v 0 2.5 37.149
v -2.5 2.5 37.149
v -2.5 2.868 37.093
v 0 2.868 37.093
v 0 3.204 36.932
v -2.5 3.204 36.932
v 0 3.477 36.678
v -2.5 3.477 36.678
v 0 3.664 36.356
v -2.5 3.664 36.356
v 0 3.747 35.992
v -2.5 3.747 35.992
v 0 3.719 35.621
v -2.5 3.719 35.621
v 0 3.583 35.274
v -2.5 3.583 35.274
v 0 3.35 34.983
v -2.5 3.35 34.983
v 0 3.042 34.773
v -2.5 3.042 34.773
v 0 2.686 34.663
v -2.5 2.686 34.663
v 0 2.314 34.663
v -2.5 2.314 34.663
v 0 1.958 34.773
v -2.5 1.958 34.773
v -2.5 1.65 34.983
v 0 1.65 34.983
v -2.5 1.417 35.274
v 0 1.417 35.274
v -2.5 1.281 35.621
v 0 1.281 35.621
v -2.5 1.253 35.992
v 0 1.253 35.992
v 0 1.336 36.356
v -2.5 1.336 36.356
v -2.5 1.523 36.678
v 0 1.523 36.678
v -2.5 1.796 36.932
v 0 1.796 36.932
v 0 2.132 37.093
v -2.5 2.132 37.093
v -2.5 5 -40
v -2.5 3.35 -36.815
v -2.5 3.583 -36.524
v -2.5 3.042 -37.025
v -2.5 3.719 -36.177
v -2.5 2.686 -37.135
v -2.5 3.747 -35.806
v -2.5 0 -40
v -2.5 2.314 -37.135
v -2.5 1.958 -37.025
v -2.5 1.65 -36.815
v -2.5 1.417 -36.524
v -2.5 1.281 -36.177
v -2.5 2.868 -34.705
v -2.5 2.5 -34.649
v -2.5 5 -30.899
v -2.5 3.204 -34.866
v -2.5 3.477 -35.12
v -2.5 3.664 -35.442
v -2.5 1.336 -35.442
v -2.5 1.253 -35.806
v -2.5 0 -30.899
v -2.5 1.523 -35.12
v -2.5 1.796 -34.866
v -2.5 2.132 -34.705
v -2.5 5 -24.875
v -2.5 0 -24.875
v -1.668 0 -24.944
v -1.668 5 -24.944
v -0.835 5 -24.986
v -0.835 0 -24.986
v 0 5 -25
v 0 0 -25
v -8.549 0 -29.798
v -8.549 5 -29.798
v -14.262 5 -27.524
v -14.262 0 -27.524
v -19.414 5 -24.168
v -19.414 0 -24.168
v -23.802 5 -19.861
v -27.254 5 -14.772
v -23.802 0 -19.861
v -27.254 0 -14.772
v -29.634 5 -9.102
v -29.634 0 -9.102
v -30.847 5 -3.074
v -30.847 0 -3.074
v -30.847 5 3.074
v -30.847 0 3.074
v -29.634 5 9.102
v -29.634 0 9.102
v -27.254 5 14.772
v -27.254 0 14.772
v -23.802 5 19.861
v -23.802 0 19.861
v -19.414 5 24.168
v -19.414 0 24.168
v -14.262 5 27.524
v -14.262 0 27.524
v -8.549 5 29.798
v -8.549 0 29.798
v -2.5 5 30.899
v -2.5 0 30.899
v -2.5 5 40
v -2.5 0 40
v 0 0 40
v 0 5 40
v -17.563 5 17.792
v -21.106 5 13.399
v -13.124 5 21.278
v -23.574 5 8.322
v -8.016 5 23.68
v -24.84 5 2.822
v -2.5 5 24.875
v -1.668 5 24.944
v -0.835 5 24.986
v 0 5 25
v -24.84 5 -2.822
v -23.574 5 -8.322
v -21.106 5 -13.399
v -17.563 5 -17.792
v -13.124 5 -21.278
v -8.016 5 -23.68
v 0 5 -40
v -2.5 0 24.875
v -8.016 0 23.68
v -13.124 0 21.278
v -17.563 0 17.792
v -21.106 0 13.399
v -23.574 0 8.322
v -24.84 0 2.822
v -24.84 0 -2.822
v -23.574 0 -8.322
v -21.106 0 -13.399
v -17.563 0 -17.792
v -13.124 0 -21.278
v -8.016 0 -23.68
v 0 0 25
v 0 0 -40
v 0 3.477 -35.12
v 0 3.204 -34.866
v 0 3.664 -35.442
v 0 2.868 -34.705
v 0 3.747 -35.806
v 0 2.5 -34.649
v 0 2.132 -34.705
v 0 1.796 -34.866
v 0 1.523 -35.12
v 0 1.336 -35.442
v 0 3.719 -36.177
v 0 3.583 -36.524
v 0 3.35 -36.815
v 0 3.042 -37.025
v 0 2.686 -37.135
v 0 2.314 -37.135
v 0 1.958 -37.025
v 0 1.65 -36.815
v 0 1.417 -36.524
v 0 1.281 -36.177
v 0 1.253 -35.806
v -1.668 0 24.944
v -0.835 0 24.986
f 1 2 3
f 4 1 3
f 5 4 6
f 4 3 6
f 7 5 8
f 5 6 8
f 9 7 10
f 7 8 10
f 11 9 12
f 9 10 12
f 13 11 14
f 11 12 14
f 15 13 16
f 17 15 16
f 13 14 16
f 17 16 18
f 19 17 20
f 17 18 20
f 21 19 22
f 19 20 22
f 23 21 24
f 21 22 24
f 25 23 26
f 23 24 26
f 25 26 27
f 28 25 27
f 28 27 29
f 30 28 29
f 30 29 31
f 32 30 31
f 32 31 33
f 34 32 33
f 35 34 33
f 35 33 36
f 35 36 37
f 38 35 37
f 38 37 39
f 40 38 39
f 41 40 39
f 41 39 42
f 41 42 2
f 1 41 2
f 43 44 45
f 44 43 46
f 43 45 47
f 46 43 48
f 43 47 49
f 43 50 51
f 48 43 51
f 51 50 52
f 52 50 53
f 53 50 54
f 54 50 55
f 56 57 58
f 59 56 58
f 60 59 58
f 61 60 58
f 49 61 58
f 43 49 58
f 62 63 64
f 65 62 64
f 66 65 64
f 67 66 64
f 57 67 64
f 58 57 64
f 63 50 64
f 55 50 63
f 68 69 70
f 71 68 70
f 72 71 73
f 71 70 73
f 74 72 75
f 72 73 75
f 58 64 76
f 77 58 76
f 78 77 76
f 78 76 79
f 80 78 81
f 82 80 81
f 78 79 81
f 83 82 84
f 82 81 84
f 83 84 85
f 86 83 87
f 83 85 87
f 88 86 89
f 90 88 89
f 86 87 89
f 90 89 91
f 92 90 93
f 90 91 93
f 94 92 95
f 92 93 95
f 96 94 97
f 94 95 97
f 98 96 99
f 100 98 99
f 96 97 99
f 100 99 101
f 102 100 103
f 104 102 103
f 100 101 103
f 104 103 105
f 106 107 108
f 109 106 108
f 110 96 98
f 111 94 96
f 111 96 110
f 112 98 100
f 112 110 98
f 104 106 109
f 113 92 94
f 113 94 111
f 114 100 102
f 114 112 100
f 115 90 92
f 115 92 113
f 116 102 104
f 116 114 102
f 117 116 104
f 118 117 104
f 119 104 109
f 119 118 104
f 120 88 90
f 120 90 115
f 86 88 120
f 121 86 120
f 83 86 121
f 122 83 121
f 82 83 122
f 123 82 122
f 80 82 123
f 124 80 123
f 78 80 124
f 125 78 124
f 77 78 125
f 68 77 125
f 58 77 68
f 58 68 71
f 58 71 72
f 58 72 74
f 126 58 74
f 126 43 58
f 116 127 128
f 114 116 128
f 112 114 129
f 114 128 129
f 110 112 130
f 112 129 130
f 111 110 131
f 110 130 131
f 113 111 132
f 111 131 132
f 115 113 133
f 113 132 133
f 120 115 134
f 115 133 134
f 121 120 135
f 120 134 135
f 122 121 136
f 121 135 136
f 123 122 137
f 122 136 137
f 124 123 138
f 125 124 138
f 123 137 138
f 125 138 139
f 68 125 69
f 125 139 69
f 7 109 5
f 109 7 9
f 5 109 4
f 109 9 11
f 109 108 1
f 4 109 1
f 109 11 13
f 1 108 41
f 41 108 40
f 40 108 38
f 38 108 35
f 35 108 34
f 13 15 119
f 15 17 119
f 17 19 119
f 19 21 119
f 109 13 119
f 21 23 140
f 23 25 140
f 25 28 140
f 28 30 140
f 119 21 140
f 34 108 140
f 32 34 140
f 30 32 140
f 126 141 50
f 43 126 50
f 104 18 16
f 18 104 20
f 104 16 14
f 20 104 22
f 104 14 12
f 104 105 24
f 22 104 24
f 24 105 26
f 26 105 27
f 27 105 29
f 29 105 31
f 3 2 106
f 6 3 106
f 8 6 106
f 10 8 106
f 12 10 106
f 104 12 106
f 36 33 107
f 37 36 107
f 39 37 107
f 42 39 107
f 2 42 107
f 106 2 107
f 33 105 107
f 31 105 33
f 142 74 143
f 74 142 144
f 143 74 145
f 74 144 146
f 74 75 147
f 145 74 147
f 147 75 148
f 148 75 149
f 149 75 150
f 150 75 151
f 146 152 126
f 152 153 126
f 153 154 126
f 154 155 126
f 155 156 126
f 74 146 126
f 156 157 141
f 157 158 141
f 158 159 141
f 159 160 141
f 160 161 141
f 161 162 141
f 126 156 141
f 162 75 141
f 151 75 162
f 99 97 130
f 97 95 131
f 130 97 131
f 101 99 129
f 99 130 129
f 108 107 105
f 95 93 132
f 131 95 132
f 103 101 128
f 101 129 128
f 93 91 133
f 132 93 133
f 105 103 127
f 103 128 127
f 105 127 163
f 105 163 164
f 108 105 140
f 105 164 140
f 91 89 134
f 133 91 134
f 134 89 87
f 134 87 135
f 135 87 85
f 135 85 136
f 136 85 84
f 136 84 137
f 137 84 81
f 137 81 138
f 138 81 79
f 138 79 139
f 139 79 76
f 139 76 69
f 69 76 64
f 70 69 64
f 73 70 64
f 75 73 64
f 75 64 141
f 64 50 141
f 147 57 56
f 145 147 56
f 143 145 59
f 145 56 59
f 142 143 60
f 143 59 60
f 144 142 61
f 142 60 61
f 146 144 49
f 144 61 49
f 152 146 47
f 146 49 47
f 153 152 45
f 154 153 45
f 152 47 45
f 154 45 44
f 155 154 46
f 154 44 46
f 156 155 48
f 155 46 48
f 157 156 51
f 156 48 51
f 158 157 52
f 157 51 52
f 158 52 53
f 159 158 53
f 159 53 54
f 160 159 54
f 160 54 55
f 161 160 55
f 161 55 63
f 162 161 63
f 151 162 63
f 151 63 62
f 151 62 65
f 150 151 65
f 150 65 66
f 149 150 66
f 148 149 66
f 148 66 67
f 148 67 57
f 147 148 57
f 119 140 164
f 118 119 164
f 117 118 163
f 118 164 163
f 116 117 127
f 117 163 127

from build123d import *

# Parameters (mm, degrees)
BOSS_EXTRUDE1_DEPTH = 5
SKETCH5_R           = 1.25
CUT_EXTRUDE1_DEPTH  = 3.5


with BuildPart() as part:
    # Sketch1 → Boss-Extrude1 (new body)
    with BuildSketch(Plane(origin=(0, 0, 0), x_dir=(1, 0, 0), z_dir=(0, 1, 0))):
        with BuildLine():
            Line((-2.5, -30.899029111), (-2.5, -24.874685928))
            ThreePointArc((-2.5, -24.874685928), (-25, 0), (-2.5, 24.874685928))
            Line((-2.5, 24.874685928), (-2.5, 30.899029111))
            ThreePointArc((-2.5, 30.899029111), (-31, 0), (-2.5, -30.899029111))
        make_face()
        with BuildLine():
            Line((0, -31), (0, -25))
            ThreePointArc((0, -25), (-1.251569376, -24.968651828), (-2.5, -24.874685928))
            Line((-2.5, -24.874685928), (-2.5, -30.899029111))
            ThreePointArc((-2.5, -30.899029111), (-1.251019097, -30.974746992), (0, -31))
        make_face()
        with BuildLine():
            Line((0, -40), (0, -31))
            ThreePointArc((0, -31), (-1.251019097, -30.974746992), (-2.5, -30.899029111))
            Line((-2.5, -30.899029111), (-2.5, -40))
            Line((-2.5, -40), (0, -40))
        make_face()
        with BuildLine():
            Line((-2.5, 30.899029111), (-2.5, 24.874685928))
            ThreePointArc((-2.5, 24.874685928), (-1.251569376, 24.968651828), (0, 25))
            Line((0, 25), (0, 31))
            ThreePointArc((0, 31), (-1.251019097, 30.974746992), (-2.5, 30.899029111))
        make_face()
        with BuildLine():
            Line((-2.5, 40), (-2.5, 30.899029111))
            ThreePointArc((-2.5, 30.899029111), (-1.251019097, 30.974746992), (0, 31))
            Line((0, 31), (0, 40))
            Line((0, 40), (-2.5, 40))
        make_face()
    extrude(amount=BOSS_EXTRUDE1_DEPTH)

    # Sketch5 → Cut-Extrude1 (cut, through all)
    with BuildSketch(Plane.ZY.offset(2.5)):
        with Locations((-35.899029111, 2.5)):
            Circle(SKETCH5_R)
        with Locations((35.899029111, 2.5)):
            Circle(SKETCH5_R)
    extrude(amount=-CUT_EXTRUDE1_DEPTH, mode=Mode.SUBTRACT)


solid = part.part
